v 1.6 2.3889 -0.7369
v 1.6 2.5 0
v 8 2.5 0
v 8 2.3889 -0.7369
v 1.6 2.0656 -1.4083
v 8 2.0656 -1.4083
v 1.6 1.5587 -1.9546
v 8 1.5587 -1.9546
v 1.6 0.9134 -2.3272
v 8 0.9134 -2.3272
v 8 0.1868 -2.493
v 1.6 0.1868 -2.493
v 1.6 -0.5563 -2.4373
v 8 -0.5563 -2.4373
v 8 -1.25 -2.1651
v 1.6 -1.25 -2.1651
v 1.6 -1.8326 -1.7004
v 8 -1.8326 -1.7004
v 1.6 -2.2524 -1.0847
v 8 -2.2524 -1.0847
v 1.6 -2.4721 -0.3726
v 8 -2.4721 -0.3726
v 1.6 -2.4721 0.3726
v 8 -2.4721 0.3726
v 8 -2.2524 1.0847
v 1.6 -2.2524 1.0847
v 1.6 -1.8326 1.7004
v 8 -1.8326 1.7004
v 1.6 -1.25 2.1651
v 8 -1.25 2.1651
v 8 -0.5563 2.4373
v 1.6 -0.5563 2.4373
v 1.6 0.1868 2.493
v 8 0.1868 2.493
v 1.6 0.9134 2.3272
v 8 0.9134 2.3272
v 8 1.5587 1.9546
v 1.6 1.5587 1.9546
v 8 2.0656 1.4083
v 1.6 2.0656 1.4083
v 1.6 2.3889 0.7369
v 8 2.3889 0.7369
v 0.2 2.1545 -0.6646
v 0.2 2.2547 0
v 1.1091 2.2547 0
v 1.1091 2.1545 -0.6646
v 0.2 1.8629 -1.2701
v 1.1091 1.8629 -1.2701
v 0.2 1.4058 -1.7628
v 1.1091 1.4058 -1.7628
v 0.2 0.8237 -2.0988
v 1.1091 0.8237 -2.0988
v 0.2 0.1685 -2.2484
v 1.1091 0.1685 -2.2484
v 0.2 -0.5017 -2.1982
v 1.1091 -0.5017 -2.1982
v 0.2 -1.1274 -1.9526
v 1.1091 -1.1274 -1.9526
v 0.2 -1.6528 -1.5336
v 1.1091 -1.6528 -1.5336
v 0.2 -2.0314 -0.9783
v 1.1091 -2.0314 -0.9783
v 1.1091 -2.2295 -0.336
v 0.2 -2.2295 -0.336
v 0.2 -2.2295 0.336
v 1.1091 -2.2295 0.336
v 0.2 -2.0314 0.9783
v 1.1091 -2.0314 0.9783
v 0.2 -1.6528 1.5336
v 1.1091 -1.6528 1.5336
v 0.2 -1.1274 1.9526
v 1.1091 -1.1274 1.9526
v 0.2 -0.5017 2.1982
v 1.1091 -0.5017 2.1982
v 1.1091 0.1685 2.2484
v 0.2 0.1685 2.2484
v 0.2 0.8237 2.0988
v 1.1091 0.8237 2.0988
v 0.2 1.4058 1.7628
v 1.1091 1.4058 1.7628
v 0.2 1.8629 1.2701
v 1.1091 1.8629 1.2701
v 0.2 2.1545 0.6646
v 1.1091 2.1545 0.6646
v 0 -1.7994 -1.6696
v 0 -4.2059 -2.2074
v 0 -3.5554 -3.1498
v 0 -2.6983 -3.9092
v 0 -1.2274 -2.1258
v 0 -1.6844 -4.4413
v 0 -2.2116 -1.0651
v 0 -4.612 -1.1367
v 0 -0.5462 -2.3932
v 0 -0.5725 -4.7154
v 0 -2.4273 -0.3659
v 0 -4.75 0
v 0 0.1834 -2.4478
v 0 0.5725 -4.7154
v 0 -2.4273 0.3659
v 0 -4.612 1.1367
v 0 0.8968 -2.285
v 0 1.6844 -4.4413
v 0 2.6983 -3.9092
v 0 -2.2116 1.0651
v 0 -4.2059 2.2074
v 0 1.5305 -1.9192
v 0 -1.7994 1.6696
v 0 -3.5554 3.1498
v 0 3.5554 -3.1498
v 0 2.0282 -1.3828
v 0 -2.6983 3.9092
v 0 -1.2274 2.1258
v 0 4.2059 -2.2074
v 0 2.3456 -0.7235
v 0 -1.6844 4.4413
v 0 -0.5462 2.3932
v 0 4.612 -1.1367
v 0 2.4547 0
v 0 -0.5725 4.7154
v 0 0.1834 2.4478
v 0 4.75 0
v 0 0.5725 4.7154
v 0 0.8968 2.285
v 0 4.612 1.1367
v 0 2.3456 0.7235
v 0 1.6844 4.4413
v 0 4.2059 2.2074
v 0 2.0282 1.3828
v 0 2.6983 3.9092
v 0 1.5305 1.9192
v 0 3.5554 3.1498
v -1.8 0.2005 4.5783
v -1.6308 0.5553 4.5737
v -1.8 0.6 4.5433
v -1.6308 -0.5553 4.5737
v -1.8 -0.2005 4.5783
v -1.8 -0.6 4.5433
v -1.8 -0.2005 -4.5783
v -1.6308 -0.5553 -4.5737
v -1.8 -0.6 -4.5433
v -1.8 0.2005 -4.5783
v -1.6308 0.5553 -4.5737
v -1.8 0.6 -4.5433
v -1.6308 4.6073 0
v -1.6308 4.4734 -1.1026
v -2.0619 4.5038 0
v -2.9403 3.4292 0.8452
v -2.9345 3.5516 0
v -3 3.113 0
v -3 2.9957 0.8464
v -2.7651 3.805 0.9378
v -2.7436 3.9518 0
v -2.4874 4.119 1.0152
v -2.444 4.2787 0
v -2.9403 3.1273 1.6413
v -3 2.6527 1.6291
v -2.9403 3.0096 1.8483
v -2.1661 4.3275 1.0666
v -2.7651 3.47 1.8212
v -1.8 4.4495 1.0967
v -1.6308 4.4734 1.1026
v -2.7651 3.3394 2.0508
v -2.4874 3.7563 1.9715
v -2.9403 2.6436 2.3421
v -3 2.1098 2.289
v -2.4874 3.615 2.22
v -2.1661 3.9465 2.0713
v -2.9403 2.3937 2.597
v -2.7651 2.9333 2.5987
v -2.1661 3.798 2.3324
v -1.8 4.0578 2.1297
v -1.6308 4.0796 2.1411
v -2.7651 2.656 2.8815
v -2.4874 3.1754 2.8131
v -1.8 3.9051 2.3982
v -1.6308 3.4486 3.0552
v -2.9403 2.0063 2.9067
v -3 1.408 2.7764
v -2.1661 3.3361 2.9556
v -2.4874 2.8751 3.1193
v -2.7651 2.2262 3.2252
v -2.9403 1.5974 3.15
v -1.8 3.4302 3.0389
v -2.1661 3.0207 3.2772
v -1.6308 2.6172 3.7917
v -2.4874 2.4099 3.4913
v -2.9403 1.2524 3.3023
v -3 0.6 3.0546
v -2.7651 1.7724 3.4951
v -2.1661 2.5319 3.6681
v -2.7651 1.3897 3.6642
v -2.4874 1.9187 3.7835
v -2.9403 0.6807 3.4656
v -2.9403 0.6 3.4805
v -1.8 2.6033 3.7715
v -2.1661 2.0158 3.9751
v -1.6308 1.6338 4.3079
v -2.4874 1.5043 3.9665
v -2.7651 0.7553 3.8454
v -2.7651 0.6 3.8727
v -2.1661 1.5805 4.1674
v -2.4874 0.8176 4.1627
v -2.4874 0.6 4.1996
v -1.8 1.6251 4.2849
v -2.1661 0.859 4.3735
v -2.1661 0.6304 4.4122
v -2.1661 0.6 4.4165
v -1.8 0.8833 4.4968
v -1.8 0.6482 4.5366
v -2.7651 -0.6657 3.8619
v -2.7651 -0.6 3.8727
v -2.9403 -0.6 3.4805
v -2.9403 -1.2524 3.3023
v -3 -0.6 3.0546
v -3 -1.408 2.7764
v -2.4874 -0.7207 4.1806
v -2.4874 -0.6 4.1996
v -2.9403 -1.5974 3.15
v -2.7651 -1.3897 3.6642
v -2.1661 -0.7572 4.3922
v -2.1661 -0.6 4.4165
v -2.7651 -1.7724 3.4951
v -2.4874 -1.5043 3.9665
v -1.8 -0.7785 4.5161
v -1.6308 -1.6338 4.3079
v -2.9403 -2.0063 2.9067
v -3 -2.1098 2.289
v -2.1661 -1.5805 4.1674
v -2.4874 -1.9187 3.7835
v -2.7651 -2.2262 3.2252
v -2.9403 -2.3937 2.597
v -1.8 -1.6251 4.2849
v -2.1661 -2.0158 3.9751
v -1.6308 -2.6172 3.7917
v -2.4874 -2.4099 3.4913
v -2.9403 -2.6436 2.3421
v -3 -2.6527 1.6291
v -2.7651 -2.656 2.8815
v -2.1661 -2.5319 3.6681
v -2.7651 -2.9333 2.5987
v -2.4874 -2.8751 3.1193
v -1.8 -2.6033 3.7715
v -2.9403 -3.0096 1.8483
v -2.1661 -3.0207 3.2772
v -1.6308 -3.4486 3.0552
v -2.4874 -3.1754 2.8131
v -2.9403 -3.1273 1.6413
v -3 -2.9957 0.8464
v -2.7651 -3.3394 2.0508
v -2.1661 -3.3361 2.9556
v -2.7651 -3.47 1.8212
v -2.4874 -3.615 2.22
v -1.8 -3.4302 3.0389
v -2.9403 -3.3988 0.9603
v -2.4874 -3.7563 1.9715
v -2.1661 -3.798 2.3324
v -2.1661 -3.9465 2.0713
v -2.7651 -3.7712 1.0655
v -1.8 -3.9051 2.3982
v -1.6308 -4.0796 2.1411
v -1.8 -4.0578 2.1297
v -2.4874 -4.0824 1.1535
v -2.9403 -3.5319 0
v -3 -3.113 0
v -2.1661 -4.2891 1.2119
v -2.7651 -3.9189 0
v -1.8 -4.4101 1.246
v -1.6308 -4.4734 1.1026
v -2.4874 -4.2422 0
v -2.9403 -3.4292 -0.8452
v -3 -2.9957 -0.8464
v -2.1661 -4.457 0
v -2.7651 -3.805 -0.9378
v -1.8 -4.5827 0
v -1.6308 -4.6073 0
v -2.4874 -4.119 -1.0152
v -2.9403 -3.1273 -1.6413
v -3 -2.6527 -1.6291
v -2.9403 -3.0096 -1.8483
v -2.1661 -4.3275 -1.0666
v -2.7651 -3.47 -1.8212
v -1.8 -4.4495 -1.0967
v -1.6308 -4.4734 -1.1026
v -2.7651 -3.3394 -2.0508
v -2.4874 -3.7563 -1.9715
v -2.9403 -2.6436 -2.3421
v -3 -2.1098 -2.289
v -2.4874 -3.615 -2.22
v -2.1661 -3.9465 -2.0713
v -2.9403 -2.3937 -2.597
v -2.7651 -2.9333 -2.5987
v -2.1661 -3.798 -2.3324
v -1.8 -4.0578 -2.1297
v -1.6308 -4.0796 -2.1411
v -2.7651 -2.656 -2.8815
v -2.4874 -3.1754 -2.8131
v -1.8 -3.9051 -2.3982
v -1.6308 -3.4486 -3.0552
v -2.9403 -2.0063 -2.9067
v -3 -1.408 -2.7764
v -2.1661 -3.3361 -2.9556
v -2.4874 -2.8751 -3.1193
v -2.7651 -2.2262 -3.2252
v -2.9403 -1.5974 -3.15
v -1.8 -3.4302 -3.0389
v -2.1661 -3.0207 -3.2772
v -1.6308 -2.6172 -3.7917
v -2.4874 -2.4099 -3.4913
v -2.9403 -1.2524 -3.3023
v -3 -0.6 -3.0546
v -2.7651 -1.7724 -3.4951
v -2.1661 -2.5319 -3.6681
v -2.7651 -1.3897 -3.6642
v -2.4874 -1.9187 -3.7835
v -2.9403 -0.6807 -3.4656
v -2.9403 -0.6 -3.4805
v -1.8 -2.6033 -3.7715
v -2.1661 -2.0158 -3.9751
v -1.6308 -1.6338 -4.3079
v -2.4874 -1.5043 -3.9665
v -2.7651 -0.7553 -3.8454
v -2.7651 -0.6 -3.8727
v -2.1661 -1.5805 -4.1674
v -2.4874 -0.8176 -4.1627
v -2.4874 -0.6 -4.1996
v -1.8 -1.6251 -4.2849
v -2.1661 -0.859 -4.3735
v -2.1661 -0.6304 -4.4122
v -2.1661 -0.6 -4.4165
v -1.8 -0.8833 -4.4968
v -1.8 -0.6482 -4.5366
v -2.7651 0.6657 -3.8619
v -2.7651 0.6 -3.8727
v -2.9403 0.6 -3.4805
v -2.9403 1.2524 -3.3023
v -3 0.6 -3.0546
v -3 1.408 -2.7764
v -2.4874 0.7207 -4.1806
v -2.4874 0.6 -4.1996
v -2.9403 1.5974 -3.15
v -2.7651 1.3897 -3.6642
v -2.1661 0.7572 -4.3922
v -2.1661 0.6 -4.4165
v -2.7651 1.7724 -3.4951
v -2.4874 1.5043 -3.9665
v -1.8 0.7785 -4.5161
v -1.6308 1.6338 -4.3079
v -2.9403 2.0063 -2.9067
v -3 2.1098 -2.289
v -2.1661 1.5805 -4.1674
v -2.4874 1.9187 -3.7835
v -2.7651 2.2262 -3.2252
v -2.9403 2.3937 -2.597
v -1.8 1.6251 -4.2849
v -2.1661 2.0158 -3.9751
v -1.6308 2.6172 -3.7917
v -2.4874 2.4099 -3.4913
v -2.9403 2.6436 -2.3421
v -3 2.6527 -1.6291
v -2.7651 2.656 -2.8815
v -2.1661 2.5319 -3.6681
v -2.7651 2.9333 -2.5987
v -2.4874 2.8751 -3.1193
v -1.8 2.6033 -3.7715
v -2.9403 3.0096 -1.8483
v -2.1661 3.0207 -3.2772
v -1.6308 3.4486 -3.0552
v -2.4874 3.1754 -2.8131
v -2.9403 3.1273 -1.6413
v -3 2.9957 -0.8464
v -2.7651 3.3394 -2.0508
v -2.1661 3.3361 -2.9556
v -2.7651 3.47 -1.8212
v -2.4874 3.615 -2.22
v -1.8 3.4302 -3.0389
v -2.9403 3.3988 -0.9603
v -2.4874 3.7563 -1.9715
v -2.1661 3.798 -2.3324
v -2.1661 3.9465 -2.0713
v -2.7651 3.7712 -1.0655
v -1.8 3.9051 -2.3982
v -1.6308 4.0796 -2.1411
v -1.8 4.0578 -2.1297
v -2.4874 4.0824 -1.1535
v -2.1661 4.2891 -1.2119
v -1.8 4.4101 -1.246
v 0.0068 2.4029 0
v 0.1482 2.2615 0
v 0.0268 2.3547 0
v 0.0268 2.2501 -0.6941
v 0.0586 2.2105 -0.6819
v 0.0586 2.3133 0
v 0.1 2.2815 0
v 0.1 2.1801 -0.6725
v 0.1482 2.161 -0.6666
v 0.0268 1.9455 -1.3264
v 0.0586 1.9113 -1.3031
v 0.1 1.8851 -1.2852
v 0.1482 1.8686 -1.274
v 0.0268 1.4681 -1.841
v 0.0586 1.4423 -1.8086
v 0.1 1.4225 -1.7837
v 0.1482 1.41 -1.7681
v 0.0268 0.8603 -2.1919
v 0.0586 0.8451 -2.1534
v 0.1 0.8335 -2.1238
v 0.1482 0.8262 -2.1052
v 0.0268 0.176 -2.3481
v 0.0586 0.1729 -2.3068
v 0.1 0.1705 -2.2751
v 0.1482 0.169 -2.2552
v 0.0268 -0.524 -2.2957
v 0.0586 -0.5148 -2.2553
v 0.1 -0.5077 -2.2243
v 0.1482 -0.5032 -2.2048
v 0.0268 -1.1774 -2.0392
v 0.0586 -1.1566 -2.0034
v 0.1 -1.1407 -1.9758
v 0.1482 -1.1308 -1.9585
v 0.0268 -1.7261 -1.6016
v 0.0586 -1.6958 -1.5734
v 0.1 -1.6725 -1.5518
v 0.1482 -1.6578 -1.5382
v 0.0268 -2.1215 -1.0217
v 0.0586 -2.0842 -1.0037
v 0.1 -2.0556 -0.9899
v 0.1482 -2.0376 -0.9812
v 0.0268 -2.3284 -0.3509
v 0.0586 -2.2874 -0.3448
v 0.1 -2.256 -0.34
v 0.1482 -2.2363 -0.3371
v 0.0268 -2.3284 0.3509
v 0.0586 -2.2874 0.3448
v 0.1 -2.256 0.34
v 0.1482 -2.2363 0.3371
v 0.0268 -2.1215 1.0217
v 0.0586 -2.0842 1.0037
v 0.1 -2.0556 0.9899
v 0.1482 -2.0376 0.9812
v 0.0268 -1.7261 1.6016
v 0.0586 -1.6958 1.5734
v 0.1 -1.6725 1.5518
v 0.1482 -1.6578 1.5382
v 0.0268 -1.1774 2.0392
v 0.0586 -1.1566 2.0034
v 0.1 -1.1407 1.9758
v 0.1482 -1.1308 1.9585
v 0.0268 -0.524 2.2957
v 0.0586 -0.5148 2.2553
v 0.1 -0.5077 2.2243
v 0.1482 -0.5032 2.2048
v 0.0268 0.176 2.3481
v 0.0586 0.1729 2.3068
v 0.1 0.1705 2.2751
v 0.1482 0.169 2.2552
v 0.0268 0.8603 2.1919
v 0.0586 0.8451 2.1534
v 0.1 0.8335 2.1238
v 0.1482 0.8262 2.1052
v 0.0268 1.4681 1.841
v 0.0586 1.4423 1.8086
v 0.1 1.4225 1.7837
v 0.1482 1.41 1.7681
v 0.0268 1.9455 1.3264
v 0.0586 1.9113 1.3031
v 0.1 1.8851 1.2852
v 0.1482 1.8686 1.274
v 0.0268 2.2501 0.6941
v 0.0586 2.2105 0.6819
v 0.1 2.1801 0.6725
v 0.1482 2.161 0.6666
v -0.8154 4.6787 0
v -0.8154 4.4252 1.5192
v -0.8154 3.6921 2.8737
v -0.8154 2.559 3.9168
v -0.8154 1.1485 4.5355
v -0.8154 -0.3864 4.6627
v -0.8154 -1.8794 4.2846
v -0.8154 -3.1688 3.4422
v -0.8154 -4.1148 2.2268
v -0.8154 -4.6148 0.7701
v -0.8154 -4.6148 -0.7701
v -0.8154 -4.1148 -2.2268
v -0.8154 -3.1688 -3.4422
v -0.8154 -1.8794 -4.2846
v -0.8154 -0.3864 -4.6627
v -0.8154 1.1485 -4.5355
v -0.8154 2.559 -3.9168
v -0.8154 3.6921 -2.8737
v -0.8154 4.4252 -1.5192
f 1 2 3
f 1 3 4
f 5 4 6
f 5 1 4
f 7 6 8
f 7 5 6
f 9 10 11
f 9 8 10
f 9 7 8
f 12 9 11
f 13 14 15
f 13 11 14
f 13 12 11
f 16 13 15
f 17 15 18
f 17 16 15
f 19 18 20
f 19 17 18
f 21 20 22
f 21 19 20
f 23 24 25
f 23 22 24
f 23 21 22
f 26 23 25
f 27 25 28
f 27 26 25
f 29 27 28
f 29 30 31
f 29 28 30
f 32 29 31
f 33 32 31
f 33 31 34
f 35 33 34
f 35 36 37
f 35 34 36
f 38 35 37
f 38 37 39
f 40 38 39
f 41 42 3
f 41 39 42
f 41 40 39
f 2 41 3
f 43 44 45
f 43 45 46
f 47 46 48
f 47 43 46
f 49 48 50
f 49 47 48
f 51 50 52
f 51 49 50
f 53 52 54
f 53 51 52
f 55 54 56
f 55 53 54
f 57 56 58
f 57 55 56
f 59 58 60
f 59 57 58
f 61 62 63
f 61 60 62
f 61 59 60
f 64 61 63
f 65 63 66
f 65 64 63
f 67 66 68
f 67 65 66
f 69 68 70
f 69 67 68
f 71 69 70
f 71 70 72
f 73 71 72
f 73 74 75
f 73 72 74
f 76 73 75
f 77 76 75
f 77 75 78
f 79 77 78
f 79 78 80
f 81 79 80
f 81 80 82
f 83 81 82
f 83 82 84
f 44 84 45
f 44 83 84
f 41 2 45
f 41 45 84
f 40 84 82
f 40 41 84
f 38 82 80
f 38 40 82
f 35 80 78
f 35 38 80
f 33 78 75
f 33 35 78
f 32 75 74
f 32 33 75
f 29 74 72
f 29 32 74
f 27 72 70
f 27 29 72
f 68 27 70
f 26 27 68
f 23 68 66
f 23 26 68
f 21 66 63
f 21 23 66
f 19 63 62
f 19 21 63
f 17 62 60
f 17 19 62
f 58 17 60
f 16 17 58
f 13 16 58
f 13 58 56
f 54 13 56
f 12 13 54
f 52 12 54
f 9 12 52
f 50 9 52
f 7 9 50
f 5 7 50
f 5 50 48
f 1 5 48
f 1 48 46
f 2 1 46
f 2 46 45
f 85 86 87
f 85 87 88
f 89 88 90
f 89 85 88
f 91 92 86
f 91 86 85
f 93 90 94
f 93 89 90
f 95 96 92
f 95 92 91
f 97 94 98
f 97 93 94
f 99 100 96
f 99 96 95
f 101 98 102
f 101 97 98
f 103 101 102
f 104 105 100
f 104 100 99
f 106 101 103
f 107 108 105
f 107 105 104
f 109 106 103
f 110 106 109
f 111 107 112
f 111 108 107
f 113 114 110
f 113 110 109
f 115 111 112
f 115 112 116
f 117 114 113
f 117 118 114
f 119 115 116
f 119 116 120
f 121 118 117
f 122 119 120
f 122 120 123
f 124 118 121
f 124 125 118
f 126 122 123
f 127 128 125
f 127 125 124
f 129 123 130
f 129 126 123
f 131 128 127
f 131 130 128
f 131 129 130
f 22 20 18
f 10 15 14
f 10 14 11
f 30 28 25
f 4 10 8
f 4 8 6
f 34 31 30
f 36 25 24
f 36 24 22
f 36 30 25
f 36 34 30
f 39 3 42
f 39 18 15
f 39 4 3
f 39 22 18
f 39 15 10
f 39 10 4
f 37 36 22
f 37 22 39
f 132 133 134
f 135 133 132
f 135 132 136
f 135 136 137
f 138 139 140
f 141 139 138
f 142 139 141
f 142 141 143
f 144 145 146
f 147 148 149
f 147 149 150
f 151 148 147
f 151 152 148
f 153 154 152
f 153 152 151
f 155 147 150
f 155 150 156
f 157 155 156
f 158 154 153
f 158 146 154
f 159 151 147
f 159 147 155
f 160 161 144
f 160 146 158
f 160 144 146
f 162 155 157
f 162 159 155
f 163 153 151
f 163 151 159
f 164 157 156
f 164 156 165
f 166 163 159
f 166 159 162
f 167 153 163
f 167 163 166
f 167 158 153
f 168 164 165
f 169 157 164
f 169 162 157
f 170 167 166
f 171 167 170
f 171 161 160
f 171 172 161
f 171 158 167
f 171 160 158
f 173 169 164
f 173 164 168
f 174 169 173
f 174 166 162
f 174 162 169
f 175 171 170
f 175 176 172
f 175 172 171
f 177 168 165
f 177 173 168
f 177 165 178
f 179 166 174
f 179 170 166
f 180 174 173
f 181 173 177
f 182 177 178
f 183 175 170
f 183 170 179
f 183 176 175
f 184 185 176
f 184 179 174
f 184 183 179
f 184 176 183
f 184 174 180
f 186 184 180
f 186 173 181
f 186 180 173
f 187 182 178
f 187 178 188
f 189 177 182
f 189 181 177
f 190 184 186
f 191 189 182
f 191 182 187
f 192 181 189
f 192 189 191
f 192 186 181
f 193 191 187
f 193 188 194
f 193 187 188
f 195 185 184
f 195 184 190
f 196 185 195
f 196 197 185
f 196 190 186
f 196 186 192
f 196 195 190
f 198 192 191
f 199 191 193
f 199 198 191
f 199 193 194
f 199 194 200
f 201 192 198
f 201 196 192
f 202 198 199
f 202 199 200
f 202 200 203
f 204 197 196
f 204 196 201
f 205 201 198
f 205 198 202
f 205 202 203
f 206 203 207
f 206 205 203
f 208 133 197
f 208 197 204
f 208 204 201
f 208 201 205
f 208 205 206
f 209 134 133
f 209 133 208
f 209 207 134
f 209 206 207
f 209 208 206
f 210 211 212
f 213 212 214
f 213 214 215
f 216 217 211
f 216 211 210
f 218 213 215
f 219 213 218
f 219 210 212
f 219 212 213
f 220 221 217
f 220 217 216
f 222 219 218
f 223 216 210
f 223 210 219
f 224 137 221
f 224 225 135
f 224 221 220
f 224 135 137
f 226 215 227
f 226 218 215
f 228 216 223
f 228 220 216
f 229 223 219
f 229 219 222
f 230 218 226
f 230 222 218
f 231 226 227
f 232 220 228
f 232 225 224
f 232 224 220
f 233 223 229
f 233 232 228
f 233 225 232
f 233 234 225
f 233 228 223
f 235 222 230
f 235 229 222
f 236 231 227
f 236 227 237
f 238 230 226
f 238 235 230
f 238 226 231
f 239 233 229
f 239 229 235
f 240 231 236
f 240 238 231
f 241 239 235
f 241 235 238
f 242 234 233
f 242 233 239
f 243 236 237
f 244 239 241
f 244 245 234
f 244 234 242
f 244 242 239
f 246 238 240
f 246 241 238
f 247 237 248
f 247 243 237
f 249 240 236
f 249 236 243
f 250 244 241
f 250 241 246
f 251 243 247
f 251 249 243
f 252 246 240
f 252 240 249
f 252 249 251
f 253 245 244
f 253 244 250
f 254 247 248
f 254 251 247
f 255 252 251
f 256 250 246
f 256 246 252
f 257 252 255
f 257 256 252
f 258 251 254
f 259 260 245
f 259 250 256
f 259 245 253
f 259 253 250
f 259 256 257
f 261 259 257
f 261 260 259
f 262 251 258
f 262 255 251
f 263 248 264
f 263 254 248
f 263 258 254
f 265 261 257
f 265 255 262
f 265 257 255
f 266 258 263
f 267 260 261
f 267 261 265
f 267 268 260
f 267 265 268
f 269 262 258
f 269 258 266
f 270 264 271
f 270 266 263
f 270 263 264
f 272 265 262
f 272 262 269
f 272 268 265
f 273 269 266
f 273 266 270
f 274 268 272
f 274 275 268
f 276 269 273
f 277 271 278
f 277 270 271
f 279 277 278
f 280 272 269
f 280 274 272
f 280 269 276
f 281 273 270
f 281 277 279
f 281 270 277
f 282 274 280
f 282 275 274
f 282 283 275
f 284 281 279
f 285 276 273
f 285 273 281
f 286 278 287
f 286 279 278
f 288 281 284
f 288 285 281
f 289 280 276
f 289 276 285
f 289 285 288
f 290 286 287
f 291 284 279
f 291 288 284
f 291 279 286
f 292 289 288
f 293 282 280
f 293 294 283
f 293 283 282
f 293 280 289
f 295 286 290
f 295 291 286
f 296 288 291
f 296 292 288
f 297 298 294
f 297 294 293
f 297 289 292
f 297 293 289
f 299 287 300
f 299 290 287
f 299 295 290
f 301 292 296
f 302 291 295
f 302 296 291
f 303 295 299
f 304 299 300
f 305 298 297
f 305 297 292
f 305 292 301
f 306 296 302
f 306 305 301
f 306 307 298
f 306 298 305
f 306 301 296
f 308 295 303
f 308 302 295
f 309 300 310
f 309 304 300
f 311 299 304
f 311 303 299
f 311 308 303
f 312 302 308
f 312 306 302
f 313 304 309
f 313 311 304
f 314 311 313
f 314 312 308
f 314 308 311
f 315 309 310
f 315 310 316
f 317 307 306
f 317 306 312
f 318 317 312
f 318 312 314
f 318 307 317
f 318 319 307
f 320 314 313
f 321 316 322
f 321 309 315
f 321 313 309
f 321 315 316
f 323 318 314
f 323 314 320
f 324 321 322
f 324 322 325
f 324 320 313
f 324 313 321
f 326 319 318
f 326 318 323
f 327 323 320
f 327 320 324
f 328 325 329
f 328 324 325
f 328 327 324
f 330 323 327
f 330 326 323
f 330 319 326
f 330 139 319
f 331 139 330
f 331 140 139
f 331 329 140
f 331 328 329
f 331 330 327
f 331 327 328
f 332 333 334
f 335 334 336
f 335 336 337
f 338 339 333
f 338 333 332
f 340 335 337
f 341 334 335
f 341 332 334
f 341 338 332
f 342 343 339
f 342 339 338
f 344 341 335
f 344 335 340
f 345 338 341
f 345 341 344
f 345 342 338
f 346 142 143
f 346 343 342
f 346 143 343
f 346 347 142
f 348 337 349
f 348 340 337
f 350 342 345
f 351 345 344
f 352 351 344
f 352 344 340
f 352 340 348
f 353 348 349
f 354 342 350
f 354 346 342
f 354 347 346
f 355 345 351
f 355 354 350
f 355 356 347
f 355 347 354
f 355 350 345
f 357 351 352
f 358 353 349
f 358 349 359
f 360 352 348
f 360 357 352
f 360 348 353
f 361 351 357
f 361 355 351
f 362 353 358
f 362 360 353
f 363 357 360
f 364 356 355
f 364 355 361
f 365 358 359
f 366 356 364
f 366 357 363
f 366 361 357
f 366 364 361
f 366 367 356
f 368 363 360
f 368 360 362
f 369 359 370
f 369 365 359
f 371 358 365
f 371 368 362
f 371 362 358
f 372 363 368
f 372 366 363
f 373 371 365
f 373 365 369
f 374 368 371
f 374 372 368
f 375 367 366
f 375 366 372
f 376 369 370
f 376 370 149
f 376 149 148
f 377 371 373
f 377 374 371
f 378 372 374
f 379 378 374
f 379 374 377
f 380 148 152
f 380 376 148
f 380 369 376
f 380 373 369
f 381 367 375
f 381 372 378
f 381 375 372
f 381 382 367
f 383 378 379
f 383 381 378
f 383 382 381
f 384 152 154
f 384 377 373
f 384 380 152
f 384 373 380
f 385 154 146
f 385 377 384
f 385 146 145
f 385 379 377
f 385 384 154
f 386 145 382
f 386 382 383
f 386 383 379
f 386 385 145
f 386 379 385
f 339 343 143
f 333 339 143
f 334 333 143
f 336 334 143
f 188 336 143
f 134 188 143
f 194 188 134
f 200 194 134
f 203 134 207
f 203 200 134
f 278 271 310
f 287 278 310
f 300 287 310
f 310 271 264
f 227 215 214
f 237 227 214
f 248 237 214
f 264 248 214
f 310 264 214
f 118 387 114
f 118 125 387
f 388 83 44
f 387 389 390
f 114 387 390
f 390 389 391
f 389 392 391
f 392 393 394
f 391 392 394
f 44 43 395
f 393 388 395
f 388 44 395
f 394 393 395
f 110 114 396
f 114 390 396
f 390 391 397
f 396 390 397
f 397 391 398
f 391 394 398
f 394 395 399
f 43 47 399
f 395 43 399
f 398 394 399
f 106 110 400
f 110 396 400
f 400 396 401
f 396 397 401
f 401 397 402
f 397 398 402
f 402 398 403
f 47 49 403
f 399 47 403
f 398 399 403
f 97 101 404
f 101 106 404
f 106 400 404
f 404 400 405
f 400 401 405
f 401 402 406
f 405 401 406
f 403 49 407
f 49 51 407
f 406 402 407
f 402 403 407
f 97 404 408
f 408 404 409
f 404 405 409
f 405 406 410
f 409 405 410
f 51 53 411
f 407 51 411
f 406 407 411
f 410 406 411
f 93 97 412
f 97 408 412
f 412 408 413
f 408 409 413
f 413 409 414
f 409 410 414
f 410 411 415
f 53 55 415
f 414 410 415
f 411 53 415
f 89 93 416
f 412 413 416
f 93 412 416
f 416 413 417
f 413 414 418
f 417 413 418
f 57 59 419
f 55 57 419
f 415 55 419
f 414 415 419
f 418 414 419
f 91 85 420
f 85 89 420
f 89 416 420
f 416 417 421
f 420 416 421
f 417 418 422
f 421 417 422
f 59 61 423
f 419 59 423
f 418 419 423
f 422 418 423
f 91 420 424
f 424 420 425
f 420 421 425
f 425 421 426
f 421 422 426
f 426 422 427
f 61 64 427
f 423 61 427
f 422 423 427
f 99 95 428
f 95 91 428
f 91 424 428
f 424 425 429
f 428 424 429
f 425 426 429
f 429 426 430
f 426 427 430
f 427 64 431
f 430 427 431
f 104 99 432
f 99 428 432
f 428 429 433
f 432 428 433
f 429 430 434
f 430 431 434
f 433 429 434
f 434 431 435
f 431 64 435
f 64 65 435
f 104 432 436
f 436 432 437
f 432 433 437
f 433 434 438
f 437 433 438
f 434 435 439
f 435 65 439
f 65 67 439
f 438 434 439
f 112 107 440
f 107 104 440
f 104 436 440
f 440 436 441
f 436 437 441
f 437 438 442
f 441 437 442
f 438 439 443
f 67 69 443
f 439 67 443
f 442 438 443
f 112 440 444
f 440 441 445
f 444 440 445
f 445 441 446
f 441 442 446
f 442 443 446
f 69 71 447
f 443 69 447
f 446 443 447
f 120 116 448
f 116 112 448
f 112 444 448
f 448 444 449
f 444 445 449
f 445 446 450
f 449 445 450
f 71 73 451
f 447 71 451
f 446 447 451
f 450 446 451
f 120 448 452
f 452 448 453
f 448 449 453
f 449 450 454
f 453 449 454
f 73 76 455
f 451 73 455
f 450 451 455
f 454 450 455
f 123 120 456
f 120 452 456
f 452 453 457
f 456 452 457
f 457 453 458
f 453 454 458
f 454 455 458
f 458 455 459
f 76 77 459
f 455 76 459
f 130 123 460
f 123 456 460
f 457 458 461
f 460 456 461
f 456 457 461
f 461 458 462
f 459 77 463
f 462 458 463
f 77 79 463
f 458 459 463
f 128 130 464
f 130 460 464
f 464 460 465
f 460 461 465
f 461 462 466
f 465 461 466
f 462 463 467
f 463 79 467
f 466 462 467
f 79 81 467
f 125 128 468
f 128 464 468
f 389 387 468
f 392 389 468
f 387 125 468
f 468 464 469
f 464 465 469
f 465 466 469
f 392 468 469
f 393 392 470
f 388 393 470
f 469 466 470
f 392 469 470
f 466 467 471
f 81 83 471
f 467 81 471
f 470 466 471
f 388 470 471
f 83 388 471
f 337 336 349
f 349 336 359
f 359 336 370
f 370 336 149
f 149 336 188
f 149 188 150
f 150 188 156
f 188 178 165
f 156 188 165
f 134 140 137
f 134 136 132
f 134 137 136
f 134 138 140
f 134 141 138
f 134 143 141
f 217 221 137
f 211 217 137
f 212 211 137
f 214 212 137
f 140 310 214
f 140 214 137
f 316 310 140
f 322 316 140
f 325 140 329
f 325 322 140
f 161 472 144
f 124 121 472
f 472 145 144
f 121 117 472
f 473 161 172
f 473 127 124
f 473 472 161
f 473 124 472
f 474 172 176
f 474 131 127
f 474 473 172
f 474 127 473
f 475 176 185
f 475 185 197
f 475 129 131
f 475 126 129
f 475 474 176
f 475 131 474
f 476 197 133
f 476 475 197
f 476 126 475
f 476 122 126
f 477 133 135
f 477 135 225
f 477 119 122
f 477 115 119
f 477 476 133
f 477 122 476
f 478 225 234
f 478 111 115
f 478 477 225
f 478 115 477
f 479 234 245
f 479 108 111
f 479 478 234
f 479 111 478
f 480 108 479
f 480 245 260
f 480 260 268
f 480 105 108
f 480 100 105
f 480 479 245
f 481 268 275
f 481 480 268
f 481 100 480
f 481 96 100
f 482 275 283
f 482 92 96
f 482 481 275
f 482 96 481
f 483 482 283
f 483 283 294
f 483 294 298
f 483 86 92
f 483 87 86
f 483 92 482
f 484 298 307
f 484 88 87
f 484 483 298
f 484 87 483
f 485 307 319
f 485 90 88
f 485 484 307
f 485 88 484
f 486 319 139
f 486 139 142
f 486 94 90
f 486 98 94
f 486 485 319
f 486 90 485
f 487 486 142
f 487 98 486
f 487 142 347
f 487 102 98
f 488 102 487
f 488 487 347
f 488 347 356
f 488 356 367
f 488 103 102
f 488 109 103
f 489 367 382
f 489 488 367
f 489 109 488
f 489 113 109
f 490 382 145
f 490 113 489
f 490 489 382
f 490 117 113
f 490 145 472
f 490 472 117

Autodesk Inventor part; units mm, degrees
ref_plane "YZ Plane" through (0, 0, 0) normal (1, 0, 0) x (0, 1, 0)
ref_plane "XZ Plane" through (0, 0, 0) normal (0, 1, 0) x (-1, 0, 0)
sketch "Sketch1" plane through (0, 0, 0) normal (0, 0, 1) x (1, 0, 0)
  line L0 (-3, 0) -> (8, 0)
  line L1 (8, 0) -> (8, 2.5)
  line L2 (8, 2.5) -> (1.6, 2.5)
  line L3 (1.6, 2.5) -> (1.1091, 2.2547)
  line L4 (1.1091, 2.2547) -> (0, 2.2547)
  line L5 (0, 2.2547) -> (0, 4.75)
  line L6 (-5.2, 0) -> (10.2, 0) projected
  line L7 (0, -0.95) -> (0, 5.7) projected
  line L8 (-3, 0) -> (-3, 4.4875)
  line L9 (0, 4.75) -> (-3, 4.4875)
  line L10 (1.6, 2.5) -> (0, 2.5) construction
  dimension "d0" = 8
  dimension "d1" = 6.4
  dimension "d2" = 0.4909
  dimension "d3" = 3
  dimension "d4" = 5
  dimension "d5" = 4.5095
  dimension "d9" = 9.5
  dimension "d10" = 5
revolve "Body" add sketch "Sketch1" angle 360 about axis through (-3, 0, 0) along (1, 0, 0)
sketch "Sketch2" plane through (-3, 0, 0) normal (-1, 0, 0) x (0, 0, 1)
  circle A0 centre (0, 0) radius 4.75 projected
  line L0 (0, 0) -> (0, 4.4875) projected
  line L1 (-4.75, 0.6) -> (4.75, 0.6)
  line L2 (4.75, 0.6) -> (4.75, -0.6)
  line L3 (4.75, -0.6) -> (-4.75, -0.6)
  line L4 (-4.75, -0.6) -> (-4.75, 0.6)
  line L5 (-4.75, 0) -> (4.75, 0) construction
  line L6 (0, 0.6) -> (0, -0.6) construction
  dimension "d11" = 1.2
  dimension "d12" = 9.5
fillet "Fillet1" radius 1.5 1 edges at (-3, -4.4875, 0)
extrude "Slot" cut sketch "Sketch2" against normal blind 1.2 contours A0 L3 L1 | L2 L3 A0 | A0 L1 L2 | A0 L4 L1 | L3 L4 A0
thread "Thread" size "M5x0.8" class "6g" standard "ISO Metric profile" length 6.4
ref_plane "Work Plane1" through (30.1625, 0, 0) normal (0, 0, -1) x (1, 0, 0)
fillet "Fillet5" radius 0.2 1 edges at (0, -2.2547, 0)
equation "\"d11\" = SBR"
equation "\"d12\" = KOD"
equation "\"d14\" = RR"
equation "\"d19\" = STI"
equation "\"d15\" = GEL"
equation "\"d41\" = R"
equation "\"d0\" = NLG"
equation "\"d1\" = GEL"
equation "\"d3\" = KOH"
equation "\"d4\" = GD"
equation "\"d5\" = BDM"
equation "\"d9\" = KOD"
equation "\"d10\" = KEWI"
equation "\"GD\" = NND"
equation "\"NLG\" = 8"
equation "\"GEL\" = 6.4"
equation "\"KOD\" = 9.5"
equation "\"KOH\" = 3"
equation "\"GAL\" = 0.61345 * PTC"
equation "\"R\" = 0.2"
equation "\"BDM\" = 4.5095"
equation "\"GUL\" = 0.61345 * PTC"
equation "\"RR\" = 1.5"
equation "\"SBR\" = 1.2"
equation "\"STI\" = 1.2"
equation "\"KEWI\" = 5deg"
equation "\"PTC\" = 0.8"
equation "\"THREADDIA\" = 5"
equation "\"TOA\" = 30deg"
equation "\"NND\" = 5"
equation "\"GD1\" = THREADDIA - 1.2269 * PTC"
properties part number "ISO 1580 - M5 x 8" material "Steel, Mild"
